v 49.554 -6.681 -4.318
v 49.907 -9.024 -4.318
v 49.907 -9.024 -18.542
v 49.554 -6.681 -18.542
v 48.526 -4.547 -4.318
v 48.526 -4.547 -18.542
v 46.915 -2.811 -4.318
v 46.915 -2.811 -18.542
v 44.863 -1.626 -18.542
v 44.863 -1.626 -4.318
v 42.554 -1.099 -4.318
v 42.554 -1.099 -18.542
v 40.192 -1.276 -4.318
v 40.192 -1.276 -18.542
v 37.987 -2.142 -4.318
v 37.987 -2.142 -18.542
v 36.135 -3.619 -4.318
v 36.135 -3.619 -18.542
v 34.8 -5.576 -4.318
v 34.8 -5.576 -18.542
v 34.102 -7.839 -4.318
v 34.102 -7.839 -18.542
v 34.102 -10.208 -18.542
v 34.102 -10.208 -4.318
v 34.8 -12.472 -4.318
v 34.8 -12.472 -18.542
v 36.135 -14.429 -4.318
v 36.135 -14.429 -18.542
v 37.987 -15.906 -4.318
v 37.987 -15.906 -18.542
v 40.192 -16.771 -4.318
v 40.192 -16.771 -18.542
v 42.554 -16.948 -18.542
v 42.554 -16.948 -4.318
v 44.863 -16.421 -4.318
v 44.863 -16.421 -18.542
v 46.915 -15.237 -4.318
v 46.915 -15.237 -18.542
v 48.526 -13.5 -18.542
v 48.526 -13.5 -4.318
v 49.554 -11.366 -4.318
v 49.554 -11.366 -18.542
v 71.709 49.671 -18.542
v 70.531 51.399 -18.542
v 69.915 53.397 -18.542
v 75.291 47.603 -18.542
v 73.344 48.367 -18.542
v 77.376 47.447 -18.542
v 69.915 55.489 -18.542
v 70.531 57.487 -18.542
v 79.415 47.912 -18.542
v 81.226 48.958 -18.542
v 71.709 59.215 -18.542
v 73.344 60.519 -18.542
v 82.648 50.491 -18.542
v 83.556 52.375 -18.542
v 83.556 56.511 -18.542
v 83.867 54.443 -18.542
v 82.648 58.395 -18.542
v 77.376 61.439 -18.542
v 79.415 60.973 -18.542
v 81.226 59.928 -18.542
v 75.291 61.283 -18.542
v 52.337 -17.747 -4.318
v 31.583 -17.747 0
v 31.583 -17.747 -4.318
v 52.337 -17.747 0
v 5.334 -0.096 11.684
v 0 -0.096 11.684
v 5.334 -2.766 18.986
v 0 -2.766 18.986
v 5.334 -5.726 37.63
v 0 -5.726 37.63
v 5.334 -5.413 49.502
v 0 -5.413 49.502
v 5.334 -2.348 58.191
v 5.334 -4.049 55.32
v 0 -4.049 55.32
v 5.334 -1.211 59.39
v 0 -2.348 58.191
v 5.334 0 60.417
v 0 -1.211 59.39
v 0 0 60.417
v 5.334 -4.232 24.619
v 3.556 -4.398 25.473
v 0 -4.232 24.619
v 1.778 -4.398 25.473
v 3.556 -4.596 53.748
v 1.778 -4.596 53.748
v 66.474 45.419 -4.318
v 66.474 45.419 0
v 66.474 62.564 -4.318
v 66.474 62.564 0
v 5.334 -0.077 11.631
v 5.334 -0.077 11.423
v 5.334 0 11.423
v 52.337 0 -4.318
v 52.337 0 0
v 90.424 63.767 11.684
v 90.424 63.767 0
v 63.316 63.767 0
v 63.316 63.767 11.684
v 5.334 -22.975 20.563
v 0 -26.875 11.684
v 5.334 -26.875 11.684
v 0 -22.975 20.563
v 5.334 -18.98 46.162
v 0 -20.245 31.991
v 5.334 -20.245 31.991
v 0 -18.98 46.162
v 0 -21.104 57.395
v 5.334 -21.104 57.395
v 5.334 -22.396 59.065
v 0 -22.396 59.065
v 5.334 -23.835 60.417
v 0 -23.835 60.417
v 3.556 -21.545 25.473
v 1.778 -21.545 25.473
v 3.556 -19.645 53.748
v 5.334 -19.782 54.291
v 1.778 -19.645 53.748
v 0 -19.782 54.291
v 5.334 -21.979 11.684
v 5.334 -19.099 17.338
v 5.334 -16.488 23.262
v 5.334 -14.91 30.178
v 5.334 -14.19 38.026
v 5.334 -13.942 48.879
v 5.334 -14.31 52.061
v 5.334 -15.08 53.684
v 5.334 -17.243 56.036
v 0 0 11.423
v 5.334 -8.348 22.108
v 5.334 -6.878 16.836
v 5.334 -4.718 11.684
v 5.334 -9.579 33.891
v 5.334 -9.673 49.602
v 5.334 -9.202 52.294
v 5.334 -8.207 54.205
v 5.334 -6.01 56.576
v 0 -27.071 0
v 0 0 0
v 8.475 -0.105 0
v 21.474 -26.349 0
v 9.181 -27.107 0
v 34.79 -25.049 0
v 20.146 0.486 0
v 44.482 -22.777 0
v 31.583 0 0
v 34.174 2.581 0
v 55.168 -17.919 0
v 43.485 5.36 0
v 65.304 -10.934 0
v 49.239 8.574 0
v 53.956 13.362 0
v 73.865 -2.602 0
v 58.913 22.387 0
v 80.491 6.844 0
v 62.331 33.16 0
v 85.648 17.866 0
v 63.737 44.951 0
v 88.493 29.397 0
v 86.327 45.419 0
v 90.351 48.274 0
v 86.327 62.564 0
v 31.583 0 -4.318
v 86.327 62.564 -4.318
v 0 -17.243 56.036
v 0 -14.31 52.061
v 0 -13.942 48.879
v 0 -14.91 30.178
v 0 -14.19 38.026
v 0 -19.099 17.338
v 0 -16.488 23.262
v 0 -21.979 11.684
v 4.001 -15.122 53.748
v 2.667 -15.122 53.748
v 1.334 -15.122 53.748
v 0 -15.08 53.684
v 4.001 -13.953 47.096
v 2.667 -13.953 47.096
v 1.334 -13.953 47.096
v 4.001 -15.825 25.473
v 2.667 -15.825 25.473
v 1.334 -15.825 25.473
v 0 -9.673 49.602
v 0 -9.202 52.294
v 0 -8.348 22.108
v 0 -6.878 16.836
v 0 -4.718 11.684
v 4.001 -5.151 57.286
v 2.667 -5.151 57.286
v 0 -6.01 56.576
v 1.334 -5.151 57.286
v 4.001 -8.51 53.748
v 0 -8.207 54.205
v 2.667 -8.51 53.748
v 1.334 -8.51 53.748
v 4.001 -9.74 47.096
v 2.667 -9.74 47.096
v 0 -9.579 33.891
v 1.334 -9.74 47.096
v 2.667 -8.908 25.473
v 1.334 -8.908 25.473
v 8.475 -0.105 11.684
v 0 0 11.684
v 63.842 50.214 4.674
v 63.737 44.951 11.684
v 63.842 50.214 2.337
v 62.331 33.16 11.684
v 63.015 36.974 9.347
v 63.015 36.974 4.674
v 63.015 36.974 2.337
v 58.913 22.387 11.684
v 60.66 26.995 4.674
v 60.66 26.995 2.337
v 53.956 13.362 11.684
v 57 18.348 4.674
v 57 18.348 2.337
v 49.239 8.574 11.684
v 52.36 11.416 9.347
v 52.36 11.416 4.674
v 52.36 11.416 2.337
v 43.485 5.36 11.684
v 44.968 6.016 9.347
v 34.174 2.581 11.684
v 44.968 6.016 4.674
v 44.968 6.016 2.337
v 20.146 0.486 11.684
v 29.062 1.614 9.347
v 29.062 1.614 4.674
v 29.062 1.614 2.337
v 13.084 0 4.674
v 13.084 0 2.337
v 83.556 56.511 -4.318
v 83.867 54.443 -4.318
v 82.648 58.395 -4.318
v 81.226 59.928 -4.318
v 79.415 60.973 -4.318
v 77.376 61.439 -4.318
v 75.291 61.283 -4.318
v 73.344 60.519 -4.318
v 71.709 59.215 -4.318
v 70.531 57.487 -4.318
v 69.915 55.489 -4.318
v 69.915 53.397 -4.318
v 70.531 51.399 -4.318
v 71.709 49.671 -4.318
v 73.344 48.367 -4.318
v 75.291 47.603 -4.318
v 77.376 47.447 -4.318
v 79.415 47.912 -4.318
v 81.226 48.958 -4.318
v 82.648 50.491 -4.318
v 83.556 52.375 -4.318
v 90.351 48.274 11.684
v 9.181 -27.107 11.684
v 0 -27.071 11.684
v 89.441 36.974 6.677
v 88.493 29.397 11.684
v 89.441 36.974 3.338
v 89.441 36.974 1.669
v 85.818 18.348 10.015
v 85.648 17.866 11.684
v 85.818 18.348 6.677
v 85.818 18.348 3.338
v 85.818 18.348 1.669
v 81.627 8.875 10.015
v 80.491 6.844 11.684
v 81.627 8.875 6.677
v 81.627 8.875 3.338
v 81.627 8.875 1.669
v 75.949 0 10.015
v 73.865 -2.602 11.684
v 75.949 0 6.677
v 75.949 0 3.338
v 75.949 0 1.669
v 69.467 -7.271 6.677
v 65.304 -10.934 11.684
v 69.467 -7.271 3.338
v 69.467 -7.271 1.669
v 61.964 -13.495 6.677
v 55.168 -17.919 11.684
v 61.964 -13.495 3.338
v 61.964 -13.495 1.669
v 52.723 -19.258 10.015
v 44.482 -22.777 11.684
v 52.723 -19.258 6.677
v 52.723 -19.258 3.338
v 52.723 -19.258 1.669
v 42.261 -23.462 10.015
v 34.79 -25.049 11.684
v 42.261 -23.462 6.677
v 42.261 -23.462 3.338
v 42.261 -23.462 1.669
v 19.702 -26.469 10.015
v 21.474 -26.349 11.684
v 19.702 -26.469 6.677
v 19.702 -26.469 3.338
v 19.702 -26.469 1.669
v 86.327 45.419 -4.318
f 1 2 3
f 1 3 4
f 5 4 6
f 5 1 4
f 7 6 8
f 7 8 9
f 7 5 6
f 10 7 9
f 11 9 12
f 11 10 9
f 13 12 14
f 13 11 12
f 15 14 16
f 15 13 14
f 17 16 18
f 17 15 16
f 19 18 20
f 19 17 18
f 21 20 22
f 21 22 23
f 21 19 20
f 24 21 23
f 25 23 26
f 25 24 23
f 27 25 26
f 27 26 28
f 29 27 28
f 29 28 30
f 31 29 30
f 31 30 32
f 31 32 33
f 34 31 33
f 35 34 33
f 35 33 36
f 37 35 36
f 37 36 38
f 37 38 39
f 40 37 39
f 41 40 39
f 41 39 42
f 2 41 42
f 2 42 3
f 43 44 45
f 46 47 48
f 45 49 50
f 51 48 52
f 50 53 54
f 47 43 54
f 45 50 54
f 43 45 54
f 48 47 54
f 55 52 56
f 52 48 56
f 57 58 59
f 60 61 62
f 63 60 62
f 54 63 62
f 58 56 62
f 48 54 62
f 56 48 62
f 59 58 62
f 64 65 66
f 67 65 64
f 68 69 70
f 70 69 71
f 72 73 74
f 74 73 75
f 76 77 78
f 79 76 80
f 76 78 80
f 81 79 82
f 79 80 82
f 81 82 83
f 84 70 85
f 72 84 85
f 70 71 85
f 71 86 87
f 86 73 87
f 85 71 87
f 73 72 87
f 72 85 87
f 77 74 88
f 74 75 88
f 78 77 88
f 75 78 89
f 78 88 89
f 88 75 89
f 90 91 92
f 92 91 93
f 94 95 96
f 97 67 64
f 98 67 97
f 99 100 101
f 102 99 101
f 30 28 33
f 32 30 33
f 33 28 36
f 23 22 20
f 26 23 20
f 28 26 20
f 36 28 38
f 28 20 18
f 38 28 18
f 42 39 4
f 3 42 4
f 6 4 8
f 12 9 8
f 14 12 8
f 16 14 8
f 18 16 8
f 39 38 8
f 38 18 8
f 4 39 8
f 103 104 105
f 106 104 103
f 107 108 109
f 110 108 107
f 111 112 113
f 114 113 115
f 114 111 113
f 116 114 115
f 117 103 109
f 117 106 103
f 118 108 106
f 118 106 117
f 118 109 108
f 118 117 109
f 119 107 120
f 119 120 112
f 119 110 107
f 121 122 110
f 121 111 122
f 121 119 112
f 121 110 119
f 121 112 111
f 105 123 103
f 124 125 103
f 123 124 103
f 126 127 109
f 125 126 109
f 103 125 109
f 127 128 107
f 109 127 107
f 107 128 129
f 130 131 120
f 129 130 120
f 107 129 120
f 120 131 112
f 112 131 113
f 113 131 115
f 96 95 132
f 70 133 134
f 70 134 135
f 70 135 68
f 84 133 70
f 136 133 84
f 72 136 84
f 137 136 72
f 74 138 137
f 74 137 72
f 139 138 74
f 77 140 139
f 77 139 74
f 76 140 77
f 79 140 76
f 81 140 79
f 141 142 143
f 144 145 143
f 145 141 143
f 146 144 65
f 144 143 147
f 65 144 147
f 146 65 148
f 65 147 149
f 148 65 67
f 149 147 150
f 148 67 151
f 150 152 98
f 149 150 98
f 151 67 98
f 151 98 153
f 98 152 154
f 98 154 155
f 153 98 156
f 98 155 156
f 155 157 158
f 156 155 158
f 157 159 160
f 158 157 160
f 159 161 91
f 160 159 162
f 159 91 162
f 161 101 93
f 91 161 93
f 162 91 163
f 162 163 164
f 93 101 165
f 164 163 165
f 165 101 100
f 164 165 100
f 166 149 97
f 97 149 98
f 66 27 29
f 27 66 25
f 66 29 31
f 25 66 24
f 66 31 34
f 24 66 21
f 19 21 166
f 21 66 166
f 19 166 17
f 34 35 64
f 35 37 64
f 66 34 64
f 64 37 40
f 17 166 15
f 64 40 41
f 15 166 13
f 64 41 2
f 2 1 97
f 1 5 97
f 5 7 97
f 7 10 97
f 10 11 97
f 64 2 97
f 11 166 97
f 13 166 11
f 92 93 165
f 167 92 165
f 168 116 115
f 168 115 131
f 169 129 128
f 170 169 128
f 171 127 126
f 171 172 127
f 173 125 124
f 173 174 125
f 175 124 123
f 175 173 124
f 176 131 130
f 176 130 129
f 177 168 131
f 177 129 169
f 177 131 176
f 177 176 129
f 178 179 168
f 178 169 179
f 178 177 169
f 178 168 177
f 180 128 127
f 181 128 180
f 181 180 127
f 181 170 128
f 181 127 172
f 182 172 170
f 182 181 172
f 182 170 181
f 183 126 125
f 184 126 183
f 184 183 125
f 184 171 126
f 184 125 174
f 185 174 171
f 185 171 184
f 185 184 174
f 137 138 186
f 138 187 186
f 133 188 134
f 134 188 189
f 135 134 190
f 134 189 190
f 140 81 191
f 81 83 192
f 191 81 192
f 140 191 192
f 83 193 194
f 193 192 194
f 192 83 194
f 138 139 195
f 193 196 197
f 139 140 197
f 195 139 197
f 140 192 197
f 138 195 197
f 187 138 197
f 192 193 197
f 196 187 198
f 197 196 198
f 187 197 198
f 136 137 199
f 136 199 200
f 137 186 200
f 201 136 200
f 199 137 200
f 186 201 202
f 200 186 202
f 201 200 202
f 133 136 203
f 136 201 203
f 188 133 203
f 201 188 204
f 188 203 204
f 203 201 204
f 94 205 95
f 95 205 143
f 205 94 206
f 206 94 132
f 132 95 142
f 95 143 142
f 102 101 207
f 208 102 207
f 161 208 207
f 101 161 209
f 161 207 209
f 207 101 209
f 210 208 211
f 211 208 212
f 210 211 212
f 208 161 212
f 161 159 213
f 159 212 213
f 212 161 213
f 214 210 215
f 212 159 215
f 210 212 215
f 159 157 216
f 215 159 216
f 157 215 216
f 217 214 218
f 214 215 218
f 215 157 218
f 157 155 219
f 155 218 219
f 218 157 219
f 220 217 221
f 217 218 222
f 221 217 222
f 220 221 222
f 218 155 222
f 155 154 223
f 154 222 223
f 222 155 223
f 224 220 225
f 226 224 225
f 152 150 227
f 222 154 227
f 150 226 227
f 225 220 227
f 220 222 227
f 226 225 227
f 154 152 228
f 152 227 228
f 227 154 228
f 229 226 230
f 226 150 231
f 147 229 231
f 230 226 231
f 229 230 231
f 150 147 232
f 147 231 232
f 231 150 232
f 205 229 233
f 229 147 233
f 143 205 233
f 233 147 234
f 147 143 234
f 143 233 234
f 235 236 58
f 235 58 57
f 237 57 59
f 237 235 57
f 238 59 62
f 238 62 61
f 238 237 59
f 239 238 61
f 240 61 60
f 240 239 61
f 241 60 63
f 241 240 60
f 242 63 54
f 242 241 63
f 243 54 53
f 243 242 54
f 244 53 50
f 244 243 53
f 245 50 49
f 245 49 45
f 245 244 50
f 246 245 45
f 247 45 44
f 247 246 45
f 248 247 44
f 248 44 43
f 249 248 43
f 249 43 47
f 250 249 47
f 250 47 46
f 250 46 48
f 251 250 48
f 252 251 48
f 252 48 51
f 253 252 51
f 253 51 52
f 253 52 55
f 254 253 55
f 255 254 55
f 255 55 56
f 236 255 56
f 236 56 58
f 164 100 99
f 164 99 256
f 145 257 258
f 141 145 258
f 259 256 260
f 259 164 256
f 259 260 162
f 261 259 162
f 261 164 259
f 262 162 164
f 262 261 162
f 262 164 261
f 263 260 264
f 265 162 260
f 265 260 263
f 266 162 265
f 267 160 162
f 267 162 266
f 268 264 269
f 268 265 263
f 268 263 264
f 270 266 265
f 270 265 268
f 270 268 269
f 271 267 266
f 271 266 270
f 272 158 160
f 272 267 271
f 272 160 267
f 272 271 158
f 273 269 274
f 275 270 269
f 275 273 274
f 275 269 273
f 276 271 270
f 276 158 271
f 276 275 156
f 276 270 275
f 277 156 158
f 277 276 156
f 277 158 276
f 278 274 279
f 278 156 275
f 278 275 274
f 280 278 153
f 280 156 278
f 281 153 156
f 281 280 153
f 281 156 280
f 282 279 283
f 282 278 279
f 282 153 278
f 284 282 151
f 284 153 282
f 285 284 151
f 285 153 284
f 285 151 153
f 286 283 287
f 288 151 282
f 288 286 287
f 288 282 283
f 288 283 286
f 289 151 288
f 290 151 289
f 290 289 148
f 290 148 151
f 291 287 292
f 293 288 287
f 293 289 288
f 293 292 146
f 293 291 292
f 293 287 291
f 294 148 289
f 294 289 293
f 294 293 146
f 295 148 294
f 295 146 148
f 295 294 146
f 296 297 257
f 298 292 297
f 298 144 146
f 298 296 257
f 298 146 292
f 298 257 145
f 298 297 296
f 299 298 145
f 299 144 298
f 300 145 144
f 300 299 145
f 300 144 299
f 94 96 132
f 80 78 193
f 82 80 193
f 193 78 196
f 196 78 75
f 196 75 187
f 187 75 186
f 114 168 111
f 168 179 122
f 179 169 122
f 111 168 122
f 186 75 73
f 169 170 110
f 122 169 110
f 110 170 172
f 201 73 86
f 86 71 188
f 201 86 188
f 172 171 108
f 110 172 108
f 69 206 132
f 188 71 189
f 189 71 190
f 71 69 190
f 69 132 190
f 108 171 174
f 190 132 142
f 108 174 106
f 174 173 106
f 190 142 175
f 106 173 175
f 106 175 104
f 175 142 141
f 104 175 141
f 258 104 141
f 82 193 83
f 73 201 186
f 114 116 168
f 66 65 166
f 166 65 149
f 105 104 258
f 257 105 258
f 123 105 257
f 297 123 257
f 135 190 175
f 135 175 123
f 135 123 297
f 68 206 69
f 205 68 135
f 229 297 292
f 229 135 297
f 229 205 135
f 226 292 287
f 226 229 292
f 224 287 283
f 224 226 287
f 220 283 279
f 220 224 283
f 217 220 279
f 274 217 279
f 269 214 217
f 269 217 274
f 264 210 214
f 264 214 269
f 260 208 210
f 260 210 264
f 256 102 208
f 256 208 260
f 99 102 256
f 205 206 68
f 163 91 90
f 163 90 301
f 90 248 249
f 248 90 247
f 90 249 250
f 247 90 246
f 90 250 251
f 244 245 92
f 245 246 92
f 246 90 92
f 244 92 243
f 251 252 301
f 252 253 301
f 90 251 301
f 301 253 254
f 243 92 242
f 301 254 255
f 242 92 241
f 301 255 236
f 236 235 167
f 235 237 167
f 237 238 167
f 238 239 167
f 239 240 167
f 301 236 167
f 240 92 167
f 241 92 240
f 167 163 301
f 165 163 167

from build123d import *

# Parameters (mm, degrees)
F1_R     = 7.0155570226
F2_DEPTH = 18.542
F3_R     = 7.9467646893
F4_DEPTH = 18.542
F7_DEPTH = 5.334
F8_DEPTH = 11.684
F0_W     = 20.7544714212
F0_H     = 17.746578902
F0_W_2   = 19.8521018028
F0_H_2   = 17.1450003982
F9_DEPTH = 4.318


with BuildPart() as f2:
    # F1 (on Top) → F2 (new body)
    with BuildSketch(Plane.XY):
        with Locations((76.8517106771, 54.442897439)):
            Circle(F1_R)
    extrude(amount=-F2_DEPTH)



with BuildPart() as f4:
    # F3 (on Top) → F4 (new body)
    with BuildSketch(Plane.XY):
        with Locations((41.960131377, -9.023684077)):
            Circle(F3_R)
    extrude(amount=-F4_DEPTH)


with BuildPart() as f7:
    # F6 (on Right) → F7 (new body)
    with BuildSketch(Plane.YZ):
        with BuildLine():
            add(Edge.make_bspline(
                [(-27.004128322, 11.4234443754), (-24.9170712549, 15.6206381214), (-20.4925139948, 24.3371562752), (-17.3602385126, 54.0539118613), (-22.0986272096, 58.9304288492), (-23.8349272719, 60.4167338461)],
                knots=[0, 0, 0, 0, 0.323201421, 0.7663718509, 1, 1, 1, 1], degree=3))
            Line((-27.004128322, 11.4234443754), (-22.0986272096, 11.4234443754))
            add(Edge.make_bspline(
                [(-23.8349272719, 60.4167338461), (-20.3755259414, 58.5333244768), (-13.8305290902, 54.1752420005), (-13.9828351318, 46.9464555143), (-14.1446804387, 24.1753330063), (-19.9336931034, 16.1872758203), (-22.0986272096, 11.4234443754)],
                knots=[0, 0, 0, 0, 0.2285560301, 0.4078773473, 0.7293386816, 1, 1, 1, 1], degree=3))
        make_face()
    extrude(amount=F7_DEPTH)


with BuildPart() as f7b:
    # F6 (on Right) → F7, piece 2 (new body)
    with BuildSketch(Plane.YZ):
        with BuildLine():
            Line((-4.5958016999, 11.4234443754), (0, 11.4234443754))
            add(Edge.make_bspline(
                [(0, 11.4234443754), (-1.5558292644, 15.6668477759), (-5.6052633039, 24.4549985378), (-6.7930231719, 54.1771953118), (-1.846077584, 58.9573064034), (0, 60.4167338461)],
                knots=[0, 0, 0, 0, 0.3197343851, 0.7628518919, 1, 1, 1, 1], degree=3))
            add(Edge.make_bspline(
                [(0, 60.4167338461), (-3.8426967978, 58.6067863753), (-9.5985845649, 54.1181159991), (-9.7955748005, 46.9674516518), (-9.7992443925, 24.4412973301), (-6.835249773, 16.1643384386), (-4.5958016999, 11.4234443754)],
                knots=[0, 0, 0, 0, 0.2287475428, 0.4096869795, 0.733305586, 1, 1, 1, 1], degree=3))
        make_face()
    extrude(amount=F7_DEPTH)


with BuildPart() as f2_1:
    add(f2.part)

    add(f4.part)  # F8 merges F4

    add(f7.part)  # F8 merges F7

    add(f7b.part)  # F8 merges F7b
    # F5 (on Top) → F8 (join)
    with BuildSketch(Plane.XY):
        with BuildLine():
            Line((0, 0), (0, -27.0710531622))
            add(Edge.make_bspline(
                [(90.4240001332, 63.7673661113), (90.946889777, 54.9811213625), (89.7279496558, 36.9041024903), (87.016072715, 18.3355513143), (76.691665346, -0.8600546564), (62.441709707, -14.1630605577), (42.9008739567, -25.1598232125), (18.8968795163, -26.3894935088), (8.1307288286, -27.3928058719), (0, -27.0710531622)],
                knots=[0, 0, 0, 0, 0.1597346938, 0.2941128272, 0.434918622, 0.5709144334, 0.7158725886, 0.8630406795, 1, 1, 1, 1], degree=3))
            Line((90.4240001332, 63.7673661113), (63.3161887527, 63.7673661113))
            add(Edge.make_bspline(
                [(63.3161887527, 63.7673661113), (63.89678398, 55.0074521155), (64.5294580411, 37.0316782662), (57.7315789572, 17.9388743499), (46.9451503691, 3.0561166092), (12.5663186528, -0.6113698403), (4.3614469469, 0), (0, 0)],
                knots=[0, 0, 0, 0, 0.224429372, 0.4162435973, 0.596206914, 0.8431707494, 1, 1, 1, 1], degree=3))
        make_face()
    extrude(amount=F8_DEPTH)

    # F0 (on Top) → F9 (join)
    with BuildSketch(Plane.XY):
        with Locations((41.960131377, -8.873289451)):
            Rectangle(F0_W, F0_H)
        with Locations((76.4005258679, 53.9917089045)):
            Rectangle(F0_W_2, F0_H_2)
    extrude(amount=-F9_DEPTH)


solid = f2_1.part
